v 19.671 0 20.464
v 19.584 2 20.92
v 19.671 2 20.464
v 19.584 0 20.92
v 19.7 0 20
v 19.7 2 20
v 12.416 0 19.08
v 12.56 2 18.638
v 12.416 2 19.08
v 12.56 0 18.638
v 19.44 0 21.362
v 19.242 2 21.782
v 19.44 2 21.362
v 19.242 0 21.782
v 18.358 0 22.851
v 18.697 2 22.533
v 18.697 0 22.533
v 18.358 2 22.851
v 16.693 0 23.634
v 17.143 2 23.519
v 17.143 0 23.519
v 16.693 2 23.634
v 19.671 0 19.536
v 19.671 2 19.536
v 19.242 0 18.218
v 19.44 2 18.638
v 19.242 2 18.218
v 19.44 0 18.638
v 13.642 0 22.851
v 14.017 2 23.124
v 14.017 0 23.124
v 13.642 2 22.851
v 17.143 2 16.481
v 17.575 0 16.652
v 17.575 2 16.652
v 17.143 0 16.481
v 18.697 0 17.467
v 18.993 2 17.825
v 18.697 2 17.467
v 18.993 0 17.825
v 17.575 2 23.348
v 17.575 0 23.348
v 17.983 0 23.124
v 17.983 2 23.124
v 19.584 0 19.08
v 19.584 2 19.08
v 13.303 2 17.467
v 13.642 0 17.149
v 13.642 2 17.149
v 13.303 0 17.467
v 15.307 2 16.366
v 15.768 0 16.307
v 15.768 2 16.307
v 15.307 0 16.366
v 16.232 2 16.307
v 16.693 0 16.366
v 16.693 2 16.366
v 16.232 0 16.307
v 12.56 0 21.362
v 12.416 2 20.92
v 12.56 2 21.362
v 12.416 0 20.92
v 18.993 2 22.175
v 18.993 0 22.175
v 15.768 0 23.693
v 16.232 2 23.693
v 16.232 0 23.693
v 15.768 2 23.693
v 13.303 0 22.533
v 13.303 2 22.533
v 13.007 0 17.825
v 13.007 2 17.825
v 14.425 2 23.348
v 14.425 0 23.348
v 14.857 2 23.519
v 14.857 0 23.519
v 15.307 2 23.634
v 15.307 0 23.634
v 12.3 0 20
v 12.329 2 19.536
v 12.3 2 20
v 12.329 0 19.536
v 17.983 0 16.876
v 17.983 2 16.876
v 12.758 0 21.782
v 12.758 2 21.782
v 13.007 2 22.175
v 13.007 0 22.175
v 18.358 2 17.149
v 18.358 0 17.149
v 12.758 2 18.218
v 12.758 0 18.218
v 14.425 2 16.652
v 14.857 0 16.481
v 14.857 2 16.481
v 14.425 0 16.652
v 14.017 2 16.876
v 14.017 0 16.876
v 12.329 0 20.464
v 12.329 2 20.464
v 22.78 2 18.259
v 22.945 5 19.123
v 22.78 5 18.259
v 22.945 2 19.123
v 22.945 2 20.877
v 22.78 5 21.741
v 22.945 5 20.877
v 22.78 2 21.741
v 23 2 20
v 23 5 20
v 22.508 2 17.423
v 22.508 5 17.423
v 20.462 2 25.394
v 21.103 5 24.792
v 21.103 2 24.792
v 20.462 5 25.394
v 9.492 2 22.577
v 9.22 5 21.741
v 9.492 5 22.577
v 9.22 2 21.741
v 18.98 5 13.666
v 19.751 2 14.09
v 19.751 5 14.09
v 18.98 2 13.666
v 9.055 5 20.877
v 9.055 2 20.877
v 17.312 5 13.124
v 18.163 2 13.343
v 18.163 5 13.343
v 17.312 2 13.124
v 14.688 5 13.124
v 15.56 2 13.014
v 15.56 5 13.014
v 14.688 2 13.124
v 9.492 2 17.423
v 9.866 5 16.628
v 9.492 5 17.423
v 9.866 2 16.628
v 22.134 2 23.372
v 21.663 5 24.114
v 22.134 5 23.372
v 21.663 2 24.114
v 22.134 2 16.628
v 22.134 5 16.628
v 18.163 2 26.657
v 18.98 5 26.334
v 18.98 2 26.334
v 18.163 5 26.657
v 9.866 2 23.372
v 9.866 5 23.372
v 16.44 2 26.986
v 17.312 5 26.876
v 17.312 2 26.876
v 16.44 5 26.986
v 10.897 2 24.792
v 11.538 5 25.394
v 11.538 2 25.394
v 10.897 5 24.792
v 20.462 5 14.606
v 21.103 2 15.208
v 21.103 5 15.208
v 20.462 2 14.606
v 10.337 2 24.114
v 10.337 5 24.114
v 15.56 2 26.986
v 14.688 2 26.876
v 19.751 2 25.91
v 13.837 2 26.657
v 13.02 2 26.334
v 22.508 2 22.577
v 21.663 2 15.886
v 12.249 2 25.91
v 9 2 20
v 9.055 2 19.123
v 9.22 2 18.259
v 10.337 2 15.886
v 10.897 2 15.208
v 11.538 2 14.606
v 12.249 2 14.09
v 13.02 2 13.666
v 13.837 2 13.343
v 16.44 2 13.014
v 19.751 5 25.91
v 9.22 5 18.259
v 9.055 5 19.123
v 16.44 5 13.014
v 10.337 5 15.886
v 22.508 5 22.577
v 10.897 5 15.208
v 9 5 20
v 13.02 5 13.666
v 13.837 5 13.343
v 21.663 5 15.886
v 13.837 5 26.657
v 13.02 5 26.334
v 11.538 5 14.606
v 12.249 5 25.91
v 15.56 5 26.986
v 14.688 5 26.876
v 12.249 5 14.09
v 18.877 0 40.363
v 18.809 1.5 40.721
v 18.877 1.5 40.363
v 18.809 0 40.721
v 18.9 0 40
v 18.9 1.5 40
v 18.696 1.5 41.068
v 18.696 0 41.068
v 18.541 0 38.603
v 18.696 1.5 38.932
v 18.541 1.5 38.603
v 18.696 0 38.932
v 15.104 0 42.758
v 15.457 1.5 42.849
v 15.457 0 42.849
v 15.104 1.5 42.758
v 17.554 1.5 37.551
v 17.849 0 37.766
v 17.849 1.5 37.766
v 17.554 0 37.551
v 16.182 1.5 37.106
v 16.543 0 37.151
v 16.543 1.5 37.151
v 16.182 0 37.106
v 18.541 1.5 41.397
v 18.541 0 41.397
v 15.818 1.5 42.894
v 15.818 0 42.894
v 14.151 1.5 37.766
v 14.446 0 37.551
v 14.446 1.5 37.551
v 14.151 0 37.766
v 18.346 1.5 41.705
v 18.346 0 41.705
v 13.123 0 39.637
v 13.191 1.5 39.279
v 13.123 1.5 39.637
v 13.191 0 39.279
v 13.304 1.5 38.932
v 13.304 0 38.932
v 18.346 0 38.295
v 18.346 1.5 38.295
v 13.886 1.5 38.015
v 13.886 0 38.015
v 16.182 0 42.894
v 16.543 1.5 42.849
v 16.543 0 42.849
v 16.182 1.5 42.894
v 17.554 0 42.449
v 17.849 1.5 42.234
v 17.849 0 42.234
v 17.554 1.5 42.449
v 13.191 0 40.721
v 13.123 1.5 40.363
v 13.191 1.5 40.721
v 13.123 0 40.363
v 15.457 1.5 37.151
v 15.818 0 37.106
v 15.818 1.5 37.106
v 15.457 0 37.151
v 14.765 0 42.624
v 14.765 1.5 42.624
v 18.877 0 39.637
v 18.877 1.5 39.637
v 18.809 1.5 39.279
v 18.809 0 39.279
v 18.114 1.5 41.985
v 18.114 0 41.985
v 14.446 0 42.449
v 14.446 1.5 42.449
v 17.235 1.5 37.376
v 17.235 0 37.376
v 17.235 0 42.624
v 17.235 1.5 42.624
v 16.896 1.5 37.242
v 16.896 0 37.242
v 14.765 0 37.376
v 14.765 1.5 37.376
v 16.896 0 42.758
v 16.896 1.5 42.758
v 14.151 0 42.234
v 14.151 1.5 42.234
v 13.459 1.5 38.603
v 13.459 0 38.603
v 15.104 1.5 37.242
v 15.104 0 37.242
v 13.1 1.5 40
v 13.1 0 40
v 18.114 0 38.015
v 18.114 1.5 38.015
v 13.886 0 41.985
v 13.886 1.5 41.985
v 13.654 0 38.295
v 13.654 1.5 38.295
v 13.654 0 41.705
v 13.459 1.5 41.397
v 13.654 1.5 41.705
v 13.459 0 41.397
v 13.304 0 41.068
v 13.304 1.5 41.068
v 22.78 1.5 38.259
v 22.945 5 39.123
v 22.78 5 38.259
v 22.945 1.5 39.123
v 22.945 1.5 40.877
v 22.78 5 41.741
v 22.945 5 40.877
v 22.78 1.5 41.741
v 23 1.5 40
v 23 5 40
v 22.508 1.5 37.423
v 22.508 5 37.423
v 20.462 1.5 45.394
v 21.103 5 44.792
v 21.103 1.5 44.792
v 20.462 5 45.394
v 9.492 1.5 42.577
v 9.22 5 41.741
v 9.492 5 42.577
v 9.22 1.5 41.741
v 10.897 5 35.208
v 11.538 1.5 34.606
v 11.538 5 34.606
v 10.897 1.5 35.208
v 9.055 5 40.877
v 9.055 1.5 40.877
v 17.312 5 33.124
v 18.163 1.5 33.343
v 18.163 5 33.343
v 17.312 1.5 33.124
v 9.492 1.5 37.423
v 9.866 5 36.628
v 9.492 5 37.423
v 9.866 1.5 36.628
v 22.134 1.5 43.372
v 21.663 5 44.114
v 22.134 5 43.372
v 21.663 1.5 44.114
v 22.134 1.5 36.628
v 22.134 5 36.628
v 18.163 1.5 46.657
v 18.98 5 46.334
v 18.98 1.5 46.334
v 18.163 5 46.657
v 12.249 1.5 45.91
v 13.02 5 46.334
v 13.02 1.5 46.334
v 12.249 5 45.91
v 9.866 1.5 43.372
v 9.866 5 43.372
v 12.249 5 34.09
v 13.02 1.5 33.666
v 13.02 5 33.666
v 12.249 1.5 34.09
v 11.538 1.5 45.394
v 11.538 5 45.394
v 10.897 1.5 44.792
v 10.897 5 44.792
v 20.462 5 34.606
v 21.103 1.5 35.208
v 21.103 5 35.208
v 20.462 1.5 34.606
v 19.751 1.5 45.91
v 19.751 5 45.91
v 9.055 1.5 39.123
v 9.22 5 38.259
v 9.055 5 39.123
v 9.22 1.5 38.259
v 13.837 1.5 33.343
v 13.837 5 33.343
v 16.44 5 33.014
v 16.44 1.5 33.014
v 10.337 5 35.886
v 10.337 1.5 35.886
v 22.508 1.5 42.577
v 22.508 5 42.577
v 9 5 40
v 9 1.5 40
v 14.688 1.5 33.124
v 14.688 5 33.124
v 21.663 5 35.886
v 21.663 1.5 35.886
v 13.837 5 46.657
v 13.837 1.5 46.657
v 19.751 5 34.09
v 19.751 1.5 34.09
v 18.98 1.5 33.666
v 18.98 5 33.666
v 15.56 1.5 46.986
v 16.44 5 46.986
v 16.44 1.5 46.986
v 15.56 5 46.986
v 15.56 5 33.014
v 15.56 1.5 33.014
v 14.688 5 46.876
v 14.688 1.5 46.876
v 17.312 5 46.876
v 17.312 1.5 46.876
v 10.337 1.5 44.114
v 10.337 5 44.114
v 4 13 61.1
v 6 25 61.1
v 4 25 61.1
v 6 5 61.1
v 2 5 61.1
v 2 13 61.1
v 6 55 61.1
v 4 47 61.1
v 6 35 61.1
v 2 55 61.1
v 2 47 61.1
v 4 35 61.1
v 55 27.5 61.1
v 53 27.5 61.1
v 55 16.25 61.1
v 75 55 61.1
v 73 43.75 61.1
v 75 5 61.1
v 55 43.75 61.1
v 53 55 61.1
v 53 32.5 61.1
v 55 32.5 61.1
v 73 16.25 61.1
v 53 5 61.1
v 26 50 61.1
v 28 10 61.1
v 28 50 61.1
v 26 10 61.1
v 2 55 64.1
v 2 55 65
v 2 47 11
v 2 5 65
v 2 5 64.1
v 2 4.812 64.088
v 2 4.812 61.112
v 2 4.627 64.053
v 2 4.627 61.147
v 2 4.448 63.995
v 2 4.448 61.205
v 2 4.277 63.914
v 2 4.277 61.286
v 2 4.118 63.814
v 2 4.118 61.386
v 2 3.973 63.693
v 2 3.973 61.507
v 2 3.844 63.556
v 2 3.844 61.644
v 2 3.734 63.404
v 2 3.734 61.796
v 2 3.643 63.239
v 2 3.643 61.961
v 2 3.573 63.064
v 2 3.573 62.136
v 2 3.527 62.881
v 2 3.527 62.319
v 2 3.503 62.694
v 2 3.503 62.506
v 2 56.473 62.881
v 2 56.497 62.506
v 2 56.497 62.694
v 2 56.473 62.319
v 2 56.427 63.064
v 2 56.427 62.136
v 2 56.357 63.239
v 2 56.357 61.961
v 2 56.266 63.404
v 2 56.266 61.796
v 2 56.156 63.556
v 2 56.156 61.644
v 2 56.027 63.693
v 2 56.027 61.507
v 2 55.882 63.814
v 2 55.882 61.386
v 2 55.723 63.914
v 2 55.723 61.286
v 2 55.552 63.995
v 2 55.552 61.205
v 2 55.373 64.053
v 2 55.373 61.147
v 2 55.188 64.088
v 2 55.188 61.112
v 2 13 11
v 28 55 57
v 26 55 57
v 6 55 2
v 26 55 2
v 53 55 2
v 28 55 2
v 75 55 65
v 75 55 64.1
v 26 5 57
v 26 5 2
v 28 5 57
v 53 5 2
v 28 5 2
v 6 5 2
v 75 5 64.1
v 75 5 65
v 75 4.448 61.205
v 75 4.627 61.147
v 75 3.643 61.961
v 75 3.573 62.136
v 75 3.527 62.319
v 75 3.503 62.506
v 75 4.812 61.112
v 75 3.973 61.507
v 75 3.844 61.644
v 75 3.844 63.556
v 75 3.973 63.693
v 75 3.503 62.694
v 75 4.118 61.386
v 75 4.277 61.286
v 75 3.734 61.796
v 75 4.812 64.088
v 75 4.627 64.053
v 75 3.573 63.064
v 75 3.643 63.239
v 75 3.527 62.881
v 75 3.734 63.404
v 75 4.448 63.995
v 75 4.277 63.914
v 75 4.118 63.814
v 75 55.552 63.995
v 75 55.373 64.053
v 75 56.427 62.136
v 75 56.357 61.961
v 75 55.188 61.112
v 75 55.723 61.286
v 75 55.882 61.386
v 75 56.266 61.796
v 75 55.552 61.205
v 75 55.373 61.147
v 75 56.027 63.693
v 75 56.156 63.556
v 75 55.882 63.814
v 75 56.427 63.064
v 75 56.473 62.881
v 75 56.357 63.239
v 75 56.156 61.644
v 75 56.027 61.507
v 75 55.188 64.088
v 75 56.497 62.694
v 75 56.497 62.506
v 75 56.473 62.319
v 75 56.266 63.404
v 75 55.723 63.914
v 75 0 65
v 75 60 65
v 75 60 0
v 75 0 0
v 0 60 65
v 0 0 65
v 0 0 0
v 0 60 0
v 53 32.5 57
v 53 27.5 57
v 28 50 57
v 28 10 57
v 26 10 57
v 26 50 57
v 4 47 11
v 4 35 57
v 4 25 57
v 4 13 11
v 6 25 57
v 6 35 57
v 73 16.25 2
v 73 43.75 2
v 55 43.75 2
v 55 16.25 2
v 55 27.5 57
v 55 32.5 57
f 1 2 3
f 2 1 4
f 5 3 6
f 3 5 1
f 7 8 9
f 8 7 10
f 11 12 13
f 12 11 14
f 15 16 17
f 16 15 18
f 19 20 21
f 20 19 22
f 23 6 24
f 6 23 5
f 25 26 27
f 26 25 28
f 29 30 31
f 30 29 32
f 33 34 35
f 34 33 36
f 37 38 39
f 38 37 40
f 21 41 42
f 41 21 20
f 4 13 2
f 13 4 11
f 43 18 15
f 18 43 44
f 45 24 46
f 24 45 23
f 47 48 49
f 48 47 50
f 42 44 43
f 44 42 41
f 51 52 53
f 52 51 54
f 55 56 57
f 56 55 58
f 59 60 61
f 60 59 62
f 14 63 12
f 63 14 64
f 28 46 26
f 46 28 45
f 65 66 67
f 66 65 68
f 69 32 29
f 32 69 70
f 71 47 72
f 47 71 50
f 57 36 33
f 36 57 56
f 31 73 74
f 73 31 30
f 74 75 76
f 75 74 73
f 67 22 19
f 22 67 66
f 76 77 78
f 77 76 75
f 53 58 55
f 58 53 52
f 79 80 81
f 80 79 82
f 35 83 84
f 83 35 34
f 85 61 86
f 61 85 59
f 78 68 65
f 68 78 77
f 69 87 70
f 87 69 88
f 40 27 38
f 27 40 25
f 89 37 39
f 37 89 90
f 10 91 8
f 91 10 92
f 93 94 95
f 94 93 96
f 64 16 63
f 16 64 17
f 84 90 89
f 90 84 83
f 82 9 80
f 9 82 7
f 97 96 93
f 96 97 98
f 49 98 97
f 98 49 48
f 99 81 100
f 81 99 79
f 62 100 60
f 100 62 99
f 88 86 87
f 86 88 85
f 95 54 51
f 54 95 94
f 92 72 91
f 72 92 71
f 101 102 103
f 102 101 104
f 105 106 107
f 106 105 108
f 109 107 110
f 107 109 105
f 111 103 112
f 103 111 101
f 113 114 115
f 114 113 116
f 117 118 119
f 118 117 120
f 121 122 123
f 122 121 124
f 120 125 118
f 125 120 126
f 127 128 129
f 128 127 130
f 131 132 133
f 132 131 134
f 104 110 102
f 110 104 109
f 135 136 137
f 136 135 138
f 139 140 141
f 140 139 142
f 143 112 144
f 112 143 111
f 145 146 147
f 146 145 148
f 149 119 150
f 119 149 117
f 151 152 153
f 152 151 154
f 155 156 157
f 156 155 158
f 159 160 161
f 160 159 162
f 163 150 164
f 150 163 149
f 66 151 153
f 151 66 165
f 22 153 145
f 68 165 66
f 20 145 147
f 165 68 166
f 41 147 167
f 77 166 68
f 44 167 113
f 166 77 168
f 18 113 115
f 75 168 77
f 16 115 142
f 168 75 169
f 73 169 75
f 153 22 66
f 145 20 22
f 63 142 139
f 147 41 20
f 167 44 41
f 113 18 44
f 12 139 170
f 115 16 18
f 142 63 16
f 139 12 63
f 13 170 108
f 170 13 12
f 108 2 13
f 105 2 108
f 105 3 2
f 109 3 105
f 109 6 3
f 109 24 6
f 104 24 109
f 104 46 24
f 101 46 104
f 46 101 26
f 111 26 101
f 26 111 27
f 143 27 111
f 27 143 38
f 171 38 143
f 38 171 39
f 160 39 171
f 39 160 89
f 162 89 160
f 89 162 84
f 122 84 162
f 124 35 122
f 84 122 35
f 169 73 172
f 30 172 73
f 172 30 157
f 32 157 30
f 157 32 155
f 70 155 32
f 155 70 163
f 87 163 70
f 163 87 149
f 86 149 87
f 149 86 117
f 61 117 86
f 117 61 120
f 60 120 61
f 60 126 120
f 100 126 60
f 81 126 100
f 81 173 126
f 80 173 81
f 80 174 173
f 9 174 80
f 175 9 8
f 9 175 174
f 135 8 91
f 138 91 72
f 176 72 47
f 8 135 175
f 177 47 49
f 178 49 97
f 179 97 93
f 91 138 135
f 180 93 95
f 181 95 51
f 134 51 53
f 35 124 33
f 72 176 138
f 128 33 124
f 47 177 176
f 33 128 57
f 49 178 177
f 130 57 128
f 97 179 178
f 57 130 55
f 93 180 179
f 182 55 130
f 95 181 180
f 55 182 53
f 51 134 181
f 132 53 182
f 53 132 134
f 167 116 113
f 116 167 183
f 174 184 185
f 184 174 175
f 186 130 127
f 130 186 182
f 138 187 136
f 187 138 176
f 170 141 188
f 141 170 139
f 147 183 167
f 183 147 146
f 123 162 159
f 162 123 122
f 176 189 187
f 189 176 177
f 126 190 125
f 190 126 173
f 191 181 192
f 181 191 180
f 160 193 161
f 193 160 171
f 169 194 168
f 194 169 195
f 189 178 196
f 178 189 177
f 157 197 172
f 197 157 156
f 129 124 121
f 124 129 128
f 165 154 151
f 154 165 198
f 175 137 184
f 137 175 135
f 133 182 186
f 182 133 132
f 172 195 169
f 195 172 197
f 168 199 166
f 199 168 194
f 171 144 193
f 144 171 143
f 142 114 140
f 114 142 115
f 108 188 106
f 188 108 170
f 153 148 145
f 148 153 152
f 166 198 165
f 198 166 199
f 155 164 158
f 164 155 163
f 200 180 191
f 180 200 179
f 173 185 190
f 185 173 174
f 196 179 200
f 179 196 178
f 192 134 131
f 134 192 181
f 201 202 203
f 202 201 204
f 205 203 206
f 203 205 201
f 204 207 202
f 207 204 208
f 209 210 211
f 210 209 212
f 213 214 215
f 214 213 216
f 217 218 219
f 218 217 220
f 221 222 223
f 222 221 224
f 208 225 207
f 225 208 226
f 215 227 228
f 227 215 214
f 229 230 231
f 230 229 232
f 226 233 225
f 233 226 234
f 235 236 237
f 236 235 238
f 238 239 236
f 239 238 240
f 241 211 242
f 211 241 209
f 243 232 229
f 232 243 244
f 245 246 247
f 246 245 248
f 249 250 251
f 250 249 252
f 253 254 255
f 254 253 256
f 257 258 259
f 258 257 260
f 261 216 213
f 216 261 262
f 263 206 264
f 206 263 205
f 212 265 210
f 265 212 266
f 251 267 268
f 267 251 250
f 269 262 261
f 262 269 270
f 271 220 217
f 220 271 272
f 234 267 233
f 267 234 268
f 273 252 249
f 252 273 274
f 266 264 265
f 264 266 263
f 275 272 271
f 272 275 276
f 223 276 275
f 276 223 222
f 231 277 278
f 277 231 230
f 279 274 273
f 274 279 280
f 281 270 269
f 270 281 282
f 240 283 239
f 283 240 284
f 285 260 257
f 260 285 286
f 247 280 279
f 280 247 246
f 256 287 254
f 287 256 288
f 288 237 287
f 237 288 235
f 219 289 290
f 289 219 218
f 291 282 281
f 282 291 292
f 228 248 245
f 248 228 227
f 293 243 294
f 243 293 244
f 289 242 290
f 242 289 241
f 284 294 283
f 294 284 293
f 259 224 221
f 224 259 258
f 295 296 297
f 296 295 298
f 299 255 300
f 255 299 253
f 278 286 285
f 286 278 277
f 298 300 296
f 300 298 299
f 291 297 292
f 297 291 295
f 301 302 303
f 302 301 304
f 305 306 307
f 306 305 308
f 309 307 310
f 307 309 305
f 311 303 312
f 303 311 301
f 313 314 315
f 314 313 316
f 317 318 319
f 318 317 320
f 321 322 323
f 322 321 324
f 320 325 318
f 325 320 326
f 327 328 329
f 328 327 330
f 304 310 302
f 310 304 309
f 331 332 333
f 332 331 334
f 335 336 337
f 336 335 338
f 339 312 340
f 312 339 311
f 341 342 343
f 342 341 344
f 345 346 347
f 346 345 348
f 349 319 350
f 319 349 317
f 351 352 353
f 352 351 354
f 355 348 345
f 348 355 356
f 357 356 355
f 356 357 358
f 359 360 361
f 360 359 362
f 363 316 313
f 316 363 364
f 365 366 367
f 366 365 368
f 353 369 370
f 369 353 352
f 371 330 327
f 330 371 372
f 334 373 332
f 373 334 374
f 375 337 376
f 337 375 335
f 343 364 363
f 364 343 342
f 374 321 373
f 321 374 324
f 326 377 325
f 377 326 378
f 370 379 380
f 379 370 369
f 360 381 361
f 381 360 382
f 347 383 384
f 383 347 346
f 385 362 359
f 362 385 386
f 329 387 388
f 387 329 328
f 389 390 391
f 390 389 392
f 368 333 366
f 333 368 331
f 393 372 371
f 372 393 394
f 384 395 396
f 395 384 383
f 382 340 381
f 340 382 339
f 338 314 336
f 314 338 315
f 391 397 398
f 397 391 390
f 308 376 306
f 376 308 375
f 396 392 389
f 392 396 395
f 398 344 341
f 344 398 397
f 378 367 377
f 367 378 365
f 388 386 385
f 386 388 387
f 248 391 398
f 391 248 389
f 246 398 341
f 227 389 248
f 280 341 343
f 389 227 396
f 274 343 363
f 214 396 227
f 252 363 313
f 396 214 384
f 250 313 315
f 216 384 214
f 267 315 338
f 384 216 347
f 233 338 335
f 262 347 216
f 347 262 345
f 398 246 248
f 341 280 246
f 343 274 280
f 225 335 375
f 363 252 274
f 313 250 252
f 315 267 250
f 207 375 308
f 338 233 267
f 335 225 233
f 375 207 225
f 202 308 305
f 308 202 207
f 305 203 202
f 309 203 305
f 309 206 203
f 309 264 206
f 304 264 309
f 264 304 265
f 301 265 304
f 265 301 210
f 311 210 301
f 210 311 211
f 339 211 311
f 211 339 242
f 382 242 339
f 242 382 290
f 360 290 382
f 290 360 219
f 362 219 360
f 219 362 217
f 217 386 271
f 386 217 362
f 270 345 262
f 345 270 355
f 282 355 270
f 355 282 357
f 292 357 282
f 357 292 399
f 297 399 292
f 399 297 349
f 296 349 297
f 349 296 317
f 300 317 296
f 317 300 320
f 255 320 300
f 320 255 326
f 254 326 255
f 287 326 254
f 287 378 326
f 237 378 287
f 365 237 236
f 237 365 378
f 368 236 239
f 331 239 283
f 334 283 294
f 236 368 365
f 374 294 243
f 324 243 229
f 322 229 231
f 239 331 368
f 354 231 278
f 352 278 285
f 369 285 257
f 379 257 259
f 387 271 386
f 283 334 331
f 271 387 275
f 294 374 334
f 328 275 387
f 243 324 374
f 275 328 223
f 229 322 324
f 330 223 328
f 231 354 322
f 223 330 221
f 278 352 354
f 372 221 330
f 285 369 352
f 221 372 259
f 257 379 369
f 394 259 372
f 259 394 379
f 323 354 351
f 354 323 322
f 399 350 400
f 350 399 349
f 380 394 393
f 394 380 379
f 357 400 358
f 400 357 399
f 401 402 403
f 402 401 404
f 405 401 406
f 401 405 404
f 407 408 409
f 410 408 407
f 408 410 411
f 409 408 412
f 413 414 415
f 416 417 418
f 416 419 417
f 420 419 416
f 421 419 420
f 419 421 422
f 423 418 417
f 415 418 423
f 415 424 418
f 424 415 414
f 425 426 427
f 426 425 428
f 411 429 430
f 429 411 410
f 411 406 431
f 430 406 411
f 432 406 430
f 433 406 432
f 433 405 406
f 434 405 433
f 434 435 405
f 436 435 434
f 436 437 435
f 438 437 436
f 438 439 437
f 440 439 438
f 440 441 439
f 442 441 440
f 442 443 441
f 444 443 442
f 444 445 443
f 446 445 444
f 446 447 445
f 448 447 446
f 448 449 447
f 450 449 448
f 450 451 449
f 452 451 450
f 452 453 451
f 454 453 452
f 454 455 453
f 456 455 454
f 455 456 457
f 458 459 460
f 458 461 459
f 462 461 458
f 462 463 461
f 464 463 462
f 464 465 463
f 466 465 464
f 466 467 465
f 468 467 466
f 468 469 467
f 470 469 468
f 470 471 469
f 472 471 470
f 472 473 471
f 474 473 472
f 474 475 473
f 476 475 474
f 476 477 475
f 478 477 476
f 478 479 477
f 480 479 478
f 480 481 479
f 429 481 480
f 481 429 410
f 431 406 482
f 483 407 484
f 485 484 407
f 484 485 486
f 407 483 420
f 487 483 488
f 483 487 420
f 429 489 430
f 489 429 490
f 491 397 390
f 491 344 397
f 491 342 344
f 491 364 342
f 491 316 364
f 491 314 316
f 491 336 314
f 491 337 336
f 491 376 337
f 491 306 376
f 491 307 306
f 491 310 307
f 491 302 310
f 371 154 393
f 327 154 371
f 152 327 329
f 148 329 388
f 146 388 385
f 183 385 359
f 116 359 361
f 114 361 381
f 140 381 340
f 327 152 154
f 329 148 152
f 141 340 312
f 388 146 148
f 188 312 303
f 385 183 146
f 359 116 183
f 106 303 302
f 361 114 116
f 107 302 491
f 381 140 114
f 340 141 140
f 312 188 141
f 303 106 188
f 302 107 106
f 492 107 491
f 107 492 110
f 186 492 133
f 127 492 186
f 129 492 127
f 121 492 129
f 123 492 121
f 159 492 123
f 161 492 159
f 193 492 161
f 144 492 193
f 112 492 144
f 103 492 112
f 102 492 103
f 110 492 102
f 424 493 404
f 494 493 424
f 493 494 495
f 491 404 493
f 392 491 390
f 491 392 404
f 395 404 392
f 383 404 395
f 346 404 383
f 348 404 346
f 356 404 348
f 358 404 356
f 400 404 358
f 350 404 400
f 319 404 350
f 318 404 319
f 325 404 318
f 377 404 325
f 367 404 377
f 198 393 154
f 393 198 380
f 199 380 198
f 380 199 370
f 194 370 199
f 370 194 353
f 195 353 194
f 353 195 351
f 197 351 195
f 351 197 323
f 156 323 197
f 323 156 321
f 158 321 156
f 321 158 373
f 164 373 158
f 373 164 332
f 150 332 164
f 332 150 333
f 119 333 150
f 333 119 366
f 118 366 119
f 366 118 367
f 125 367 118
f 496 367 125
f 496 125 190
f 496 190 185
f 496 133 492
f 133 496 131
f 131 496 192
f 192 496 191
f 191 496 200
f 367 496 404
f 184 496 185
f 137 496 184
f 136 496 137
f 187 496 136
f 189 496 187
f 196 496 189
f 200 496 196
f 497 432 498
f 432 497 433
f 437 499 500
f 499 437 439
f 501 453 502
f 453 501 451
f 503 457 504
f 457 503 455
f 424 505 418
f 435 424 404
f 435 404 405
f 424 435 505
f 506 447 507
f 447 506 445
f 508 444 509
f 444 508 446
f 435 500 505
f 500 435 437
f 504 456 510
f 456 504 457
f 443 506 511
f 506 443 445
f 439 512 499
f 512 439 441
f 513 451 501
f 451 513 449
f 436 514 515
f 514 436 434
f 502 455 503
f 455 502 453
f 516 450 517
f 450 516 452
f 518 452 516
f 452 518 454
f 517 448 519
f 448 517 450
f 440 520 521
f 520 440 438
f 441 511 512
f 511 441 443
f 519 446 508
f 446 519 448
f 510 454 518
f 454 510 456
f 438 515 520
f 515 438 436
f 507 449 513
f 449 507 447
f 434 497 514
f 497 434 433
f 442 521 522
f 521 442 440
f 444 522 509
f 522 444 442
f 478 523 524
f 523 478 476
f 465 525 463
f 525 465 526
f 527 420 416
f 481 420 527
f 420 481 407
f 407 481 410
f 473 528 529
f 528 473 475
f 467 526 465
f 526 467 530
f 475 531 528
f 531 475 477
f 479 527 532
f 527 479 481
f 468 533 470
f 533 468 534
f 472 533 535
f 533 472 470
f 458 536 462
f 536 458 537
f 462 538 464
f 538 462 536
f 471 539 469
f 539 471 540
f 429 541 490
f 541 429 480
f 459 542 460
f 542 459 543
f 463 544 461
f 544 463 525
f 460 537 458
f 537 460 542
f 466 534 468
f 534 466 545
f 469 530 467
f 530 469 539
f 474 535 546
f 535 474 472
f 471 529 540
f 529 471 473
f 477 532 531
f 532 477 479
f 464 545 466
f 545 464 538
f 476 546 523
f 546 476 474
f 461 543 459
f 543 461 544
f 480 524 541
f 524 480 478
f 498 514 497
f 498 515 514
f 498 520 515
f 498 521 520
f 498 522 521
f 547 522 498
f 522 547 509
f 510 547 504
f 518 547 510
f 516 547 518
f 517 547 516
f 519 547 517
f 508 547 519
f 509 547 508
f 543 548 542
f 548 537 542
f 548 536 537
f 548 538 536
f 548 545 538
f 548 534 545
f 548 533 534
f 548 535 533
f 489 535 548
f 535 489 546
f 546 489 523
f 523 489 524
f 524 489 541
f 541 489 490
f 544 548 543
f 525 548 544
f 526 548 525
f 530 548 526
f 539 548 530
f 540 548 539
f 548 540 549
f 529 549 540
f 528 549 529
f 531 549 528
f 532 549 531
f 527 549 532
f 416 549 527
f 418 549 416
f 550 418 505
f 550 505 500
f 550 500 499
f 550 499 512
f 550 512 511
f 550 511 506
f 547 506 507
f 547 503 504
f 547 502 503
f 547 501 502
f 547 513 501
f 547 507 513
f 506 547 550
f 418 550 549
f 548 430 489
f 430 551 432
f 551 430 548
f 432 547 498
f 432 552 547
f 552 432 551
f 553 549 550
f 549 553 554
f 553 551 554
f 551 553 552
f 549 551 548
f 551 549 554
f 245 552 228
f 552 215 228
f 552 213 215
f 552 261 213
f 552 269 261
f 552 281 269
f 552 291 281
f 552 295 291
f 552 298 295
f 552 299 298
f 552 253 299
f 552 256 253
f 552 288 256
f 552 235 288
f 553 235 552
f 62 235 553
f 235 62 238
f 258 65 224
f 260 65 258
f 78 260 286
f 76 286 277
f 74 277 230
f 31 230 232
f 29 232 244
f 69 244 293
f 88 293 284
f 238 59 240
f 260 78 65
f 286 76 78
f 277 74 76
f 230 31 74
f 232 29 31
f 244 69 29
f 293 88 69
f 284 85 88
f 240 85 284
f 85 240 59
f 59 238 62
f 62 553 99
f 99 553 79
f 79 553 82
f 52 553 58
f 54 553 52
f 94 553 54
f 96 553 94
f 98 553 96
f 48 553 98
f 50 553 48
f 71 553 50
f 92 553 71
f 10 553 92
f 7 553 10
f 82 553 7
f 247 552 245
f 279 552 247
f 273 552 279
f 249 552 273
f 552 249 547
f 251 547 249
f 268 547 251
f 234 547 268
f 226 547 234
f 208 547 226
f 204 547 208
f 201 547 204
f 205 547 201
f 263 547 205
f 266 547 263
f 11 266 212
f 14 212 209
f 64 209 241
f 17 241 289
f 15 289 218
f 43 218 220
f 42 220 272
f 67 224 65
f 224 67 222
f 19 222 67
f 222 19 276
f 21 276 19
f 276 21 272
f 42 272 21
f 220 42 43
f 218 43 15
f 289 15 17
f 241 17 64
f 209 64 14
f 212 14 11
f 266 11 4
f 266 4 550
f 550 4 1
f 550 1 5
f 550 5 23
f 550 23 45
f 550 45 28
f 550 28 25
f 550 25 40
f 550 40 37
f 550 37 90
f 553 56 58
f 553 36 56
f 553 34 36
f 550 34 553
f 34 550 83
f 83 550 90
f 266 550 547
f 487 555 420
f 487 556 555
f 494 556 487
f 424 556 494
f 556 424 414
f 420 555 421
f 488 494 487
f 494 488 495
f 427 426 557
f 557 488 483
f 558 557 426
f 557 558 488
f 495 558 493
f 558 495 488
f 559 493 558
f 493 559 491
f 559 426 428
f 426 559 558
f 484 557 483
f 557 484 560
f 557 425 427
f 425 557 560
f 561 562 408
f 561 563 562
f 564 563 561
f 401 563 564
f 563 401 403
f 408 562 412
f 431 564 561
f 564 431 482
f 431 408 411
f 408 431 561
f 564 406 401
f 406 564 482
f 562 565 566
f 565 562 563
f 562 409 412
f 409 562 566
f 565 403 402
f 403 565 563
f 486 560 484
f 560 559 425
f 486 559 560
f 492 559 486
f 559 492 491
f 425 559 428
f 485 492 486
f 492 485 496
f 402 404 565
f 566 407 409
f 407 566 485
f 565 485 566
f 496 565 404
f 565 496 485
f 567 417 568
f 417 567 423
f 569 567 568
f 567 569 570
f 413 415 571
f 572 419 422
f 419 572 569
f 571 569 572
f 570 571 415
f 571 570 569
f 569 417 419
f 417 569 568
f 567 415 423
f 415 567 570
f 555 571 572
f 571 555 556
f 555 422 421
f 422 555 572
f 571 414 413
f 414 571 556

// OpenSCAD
coil_w = 2;
coil_h = 34;
coil_l = 43;

rfid_l = 45;
rfid_w = 24;
rfid_h = 15;

ninev_l = 56;
ninev_w = 27.5;
ninev_h = 18;

pcb_w = 50;
pcb_l = 25;
pcb_h = 60;

h = 60;
w = 50;
l = 32 + ninev_h + 20; 
side = 10;

module casing() {
  difference() {
    cube([l + 5, w + side, h + 5]);

    // pcb
    translate([28, side / 2, 2])
    cube([pcb_l, pcb_w, 100]);

    // holes
    translate([25, side / 2, h - 3])
    cube([5, 5, 5]);
    translate([25, (w - 5) + side / 2, h - 3])
    cube([5, 5, 5]);

    // coil
    translate([2, ((w + side) - coil_h) / 2, h - coil_l - 6])
    cube([coil_w, coil_h, 100]);
    translate([4, ((w + side) - 10) / 2, h - 3])
    cube([5, 10, 5]);

    // buttons & rfid board
    translate([6, side / 2, 2])
    cube([20, pcb_w, 100]);

    // 9v battery
    translate([55, ((w + side) - ninev_w) / 2, 2])
    cube([ninev_h, ninev_w, 100]);
    translate([51, ((w + side) - 5) / 2, h - 3])
    cube([5, 5, 5]);
    
    // button holes on bottom
    translate([16, 12, h - 40])
    rotate( v = [1,0,0], a = 90 ) {
      cylinder(30, r = 3.7, $fn=50 );
      cylinder(10, r = 7, $fn=50 );
    }
    translate([16, 2, h - 20])
    rotate(v=[1, 0, 0], a=90) {
      cylinder(h = 20, r = 2.9, $fn = 50);
      translate([0, 0, -4.5])
      cylinder(h = 5, r = 7, $fn = 50);
    }
    
    cover();
  }
}


module cover() {
  translate([2, side / 2, (h + 5) - 3.9]) {
    cube([l + 5, w, 4]);
    translate([0, 0, 1.5])
    rotate( v = [0,1,0], a = 90 ) {
      cylinder(l + 5, r = 1.5, $fn=50 );
    }
    translate([0, w, 1.5])
    rotate( v = [0,1,0], a = 90 ) {
      cylinder(l + 5, r = 1.5, $fn=50 );
    }
  }
}

casing();
//cover();
